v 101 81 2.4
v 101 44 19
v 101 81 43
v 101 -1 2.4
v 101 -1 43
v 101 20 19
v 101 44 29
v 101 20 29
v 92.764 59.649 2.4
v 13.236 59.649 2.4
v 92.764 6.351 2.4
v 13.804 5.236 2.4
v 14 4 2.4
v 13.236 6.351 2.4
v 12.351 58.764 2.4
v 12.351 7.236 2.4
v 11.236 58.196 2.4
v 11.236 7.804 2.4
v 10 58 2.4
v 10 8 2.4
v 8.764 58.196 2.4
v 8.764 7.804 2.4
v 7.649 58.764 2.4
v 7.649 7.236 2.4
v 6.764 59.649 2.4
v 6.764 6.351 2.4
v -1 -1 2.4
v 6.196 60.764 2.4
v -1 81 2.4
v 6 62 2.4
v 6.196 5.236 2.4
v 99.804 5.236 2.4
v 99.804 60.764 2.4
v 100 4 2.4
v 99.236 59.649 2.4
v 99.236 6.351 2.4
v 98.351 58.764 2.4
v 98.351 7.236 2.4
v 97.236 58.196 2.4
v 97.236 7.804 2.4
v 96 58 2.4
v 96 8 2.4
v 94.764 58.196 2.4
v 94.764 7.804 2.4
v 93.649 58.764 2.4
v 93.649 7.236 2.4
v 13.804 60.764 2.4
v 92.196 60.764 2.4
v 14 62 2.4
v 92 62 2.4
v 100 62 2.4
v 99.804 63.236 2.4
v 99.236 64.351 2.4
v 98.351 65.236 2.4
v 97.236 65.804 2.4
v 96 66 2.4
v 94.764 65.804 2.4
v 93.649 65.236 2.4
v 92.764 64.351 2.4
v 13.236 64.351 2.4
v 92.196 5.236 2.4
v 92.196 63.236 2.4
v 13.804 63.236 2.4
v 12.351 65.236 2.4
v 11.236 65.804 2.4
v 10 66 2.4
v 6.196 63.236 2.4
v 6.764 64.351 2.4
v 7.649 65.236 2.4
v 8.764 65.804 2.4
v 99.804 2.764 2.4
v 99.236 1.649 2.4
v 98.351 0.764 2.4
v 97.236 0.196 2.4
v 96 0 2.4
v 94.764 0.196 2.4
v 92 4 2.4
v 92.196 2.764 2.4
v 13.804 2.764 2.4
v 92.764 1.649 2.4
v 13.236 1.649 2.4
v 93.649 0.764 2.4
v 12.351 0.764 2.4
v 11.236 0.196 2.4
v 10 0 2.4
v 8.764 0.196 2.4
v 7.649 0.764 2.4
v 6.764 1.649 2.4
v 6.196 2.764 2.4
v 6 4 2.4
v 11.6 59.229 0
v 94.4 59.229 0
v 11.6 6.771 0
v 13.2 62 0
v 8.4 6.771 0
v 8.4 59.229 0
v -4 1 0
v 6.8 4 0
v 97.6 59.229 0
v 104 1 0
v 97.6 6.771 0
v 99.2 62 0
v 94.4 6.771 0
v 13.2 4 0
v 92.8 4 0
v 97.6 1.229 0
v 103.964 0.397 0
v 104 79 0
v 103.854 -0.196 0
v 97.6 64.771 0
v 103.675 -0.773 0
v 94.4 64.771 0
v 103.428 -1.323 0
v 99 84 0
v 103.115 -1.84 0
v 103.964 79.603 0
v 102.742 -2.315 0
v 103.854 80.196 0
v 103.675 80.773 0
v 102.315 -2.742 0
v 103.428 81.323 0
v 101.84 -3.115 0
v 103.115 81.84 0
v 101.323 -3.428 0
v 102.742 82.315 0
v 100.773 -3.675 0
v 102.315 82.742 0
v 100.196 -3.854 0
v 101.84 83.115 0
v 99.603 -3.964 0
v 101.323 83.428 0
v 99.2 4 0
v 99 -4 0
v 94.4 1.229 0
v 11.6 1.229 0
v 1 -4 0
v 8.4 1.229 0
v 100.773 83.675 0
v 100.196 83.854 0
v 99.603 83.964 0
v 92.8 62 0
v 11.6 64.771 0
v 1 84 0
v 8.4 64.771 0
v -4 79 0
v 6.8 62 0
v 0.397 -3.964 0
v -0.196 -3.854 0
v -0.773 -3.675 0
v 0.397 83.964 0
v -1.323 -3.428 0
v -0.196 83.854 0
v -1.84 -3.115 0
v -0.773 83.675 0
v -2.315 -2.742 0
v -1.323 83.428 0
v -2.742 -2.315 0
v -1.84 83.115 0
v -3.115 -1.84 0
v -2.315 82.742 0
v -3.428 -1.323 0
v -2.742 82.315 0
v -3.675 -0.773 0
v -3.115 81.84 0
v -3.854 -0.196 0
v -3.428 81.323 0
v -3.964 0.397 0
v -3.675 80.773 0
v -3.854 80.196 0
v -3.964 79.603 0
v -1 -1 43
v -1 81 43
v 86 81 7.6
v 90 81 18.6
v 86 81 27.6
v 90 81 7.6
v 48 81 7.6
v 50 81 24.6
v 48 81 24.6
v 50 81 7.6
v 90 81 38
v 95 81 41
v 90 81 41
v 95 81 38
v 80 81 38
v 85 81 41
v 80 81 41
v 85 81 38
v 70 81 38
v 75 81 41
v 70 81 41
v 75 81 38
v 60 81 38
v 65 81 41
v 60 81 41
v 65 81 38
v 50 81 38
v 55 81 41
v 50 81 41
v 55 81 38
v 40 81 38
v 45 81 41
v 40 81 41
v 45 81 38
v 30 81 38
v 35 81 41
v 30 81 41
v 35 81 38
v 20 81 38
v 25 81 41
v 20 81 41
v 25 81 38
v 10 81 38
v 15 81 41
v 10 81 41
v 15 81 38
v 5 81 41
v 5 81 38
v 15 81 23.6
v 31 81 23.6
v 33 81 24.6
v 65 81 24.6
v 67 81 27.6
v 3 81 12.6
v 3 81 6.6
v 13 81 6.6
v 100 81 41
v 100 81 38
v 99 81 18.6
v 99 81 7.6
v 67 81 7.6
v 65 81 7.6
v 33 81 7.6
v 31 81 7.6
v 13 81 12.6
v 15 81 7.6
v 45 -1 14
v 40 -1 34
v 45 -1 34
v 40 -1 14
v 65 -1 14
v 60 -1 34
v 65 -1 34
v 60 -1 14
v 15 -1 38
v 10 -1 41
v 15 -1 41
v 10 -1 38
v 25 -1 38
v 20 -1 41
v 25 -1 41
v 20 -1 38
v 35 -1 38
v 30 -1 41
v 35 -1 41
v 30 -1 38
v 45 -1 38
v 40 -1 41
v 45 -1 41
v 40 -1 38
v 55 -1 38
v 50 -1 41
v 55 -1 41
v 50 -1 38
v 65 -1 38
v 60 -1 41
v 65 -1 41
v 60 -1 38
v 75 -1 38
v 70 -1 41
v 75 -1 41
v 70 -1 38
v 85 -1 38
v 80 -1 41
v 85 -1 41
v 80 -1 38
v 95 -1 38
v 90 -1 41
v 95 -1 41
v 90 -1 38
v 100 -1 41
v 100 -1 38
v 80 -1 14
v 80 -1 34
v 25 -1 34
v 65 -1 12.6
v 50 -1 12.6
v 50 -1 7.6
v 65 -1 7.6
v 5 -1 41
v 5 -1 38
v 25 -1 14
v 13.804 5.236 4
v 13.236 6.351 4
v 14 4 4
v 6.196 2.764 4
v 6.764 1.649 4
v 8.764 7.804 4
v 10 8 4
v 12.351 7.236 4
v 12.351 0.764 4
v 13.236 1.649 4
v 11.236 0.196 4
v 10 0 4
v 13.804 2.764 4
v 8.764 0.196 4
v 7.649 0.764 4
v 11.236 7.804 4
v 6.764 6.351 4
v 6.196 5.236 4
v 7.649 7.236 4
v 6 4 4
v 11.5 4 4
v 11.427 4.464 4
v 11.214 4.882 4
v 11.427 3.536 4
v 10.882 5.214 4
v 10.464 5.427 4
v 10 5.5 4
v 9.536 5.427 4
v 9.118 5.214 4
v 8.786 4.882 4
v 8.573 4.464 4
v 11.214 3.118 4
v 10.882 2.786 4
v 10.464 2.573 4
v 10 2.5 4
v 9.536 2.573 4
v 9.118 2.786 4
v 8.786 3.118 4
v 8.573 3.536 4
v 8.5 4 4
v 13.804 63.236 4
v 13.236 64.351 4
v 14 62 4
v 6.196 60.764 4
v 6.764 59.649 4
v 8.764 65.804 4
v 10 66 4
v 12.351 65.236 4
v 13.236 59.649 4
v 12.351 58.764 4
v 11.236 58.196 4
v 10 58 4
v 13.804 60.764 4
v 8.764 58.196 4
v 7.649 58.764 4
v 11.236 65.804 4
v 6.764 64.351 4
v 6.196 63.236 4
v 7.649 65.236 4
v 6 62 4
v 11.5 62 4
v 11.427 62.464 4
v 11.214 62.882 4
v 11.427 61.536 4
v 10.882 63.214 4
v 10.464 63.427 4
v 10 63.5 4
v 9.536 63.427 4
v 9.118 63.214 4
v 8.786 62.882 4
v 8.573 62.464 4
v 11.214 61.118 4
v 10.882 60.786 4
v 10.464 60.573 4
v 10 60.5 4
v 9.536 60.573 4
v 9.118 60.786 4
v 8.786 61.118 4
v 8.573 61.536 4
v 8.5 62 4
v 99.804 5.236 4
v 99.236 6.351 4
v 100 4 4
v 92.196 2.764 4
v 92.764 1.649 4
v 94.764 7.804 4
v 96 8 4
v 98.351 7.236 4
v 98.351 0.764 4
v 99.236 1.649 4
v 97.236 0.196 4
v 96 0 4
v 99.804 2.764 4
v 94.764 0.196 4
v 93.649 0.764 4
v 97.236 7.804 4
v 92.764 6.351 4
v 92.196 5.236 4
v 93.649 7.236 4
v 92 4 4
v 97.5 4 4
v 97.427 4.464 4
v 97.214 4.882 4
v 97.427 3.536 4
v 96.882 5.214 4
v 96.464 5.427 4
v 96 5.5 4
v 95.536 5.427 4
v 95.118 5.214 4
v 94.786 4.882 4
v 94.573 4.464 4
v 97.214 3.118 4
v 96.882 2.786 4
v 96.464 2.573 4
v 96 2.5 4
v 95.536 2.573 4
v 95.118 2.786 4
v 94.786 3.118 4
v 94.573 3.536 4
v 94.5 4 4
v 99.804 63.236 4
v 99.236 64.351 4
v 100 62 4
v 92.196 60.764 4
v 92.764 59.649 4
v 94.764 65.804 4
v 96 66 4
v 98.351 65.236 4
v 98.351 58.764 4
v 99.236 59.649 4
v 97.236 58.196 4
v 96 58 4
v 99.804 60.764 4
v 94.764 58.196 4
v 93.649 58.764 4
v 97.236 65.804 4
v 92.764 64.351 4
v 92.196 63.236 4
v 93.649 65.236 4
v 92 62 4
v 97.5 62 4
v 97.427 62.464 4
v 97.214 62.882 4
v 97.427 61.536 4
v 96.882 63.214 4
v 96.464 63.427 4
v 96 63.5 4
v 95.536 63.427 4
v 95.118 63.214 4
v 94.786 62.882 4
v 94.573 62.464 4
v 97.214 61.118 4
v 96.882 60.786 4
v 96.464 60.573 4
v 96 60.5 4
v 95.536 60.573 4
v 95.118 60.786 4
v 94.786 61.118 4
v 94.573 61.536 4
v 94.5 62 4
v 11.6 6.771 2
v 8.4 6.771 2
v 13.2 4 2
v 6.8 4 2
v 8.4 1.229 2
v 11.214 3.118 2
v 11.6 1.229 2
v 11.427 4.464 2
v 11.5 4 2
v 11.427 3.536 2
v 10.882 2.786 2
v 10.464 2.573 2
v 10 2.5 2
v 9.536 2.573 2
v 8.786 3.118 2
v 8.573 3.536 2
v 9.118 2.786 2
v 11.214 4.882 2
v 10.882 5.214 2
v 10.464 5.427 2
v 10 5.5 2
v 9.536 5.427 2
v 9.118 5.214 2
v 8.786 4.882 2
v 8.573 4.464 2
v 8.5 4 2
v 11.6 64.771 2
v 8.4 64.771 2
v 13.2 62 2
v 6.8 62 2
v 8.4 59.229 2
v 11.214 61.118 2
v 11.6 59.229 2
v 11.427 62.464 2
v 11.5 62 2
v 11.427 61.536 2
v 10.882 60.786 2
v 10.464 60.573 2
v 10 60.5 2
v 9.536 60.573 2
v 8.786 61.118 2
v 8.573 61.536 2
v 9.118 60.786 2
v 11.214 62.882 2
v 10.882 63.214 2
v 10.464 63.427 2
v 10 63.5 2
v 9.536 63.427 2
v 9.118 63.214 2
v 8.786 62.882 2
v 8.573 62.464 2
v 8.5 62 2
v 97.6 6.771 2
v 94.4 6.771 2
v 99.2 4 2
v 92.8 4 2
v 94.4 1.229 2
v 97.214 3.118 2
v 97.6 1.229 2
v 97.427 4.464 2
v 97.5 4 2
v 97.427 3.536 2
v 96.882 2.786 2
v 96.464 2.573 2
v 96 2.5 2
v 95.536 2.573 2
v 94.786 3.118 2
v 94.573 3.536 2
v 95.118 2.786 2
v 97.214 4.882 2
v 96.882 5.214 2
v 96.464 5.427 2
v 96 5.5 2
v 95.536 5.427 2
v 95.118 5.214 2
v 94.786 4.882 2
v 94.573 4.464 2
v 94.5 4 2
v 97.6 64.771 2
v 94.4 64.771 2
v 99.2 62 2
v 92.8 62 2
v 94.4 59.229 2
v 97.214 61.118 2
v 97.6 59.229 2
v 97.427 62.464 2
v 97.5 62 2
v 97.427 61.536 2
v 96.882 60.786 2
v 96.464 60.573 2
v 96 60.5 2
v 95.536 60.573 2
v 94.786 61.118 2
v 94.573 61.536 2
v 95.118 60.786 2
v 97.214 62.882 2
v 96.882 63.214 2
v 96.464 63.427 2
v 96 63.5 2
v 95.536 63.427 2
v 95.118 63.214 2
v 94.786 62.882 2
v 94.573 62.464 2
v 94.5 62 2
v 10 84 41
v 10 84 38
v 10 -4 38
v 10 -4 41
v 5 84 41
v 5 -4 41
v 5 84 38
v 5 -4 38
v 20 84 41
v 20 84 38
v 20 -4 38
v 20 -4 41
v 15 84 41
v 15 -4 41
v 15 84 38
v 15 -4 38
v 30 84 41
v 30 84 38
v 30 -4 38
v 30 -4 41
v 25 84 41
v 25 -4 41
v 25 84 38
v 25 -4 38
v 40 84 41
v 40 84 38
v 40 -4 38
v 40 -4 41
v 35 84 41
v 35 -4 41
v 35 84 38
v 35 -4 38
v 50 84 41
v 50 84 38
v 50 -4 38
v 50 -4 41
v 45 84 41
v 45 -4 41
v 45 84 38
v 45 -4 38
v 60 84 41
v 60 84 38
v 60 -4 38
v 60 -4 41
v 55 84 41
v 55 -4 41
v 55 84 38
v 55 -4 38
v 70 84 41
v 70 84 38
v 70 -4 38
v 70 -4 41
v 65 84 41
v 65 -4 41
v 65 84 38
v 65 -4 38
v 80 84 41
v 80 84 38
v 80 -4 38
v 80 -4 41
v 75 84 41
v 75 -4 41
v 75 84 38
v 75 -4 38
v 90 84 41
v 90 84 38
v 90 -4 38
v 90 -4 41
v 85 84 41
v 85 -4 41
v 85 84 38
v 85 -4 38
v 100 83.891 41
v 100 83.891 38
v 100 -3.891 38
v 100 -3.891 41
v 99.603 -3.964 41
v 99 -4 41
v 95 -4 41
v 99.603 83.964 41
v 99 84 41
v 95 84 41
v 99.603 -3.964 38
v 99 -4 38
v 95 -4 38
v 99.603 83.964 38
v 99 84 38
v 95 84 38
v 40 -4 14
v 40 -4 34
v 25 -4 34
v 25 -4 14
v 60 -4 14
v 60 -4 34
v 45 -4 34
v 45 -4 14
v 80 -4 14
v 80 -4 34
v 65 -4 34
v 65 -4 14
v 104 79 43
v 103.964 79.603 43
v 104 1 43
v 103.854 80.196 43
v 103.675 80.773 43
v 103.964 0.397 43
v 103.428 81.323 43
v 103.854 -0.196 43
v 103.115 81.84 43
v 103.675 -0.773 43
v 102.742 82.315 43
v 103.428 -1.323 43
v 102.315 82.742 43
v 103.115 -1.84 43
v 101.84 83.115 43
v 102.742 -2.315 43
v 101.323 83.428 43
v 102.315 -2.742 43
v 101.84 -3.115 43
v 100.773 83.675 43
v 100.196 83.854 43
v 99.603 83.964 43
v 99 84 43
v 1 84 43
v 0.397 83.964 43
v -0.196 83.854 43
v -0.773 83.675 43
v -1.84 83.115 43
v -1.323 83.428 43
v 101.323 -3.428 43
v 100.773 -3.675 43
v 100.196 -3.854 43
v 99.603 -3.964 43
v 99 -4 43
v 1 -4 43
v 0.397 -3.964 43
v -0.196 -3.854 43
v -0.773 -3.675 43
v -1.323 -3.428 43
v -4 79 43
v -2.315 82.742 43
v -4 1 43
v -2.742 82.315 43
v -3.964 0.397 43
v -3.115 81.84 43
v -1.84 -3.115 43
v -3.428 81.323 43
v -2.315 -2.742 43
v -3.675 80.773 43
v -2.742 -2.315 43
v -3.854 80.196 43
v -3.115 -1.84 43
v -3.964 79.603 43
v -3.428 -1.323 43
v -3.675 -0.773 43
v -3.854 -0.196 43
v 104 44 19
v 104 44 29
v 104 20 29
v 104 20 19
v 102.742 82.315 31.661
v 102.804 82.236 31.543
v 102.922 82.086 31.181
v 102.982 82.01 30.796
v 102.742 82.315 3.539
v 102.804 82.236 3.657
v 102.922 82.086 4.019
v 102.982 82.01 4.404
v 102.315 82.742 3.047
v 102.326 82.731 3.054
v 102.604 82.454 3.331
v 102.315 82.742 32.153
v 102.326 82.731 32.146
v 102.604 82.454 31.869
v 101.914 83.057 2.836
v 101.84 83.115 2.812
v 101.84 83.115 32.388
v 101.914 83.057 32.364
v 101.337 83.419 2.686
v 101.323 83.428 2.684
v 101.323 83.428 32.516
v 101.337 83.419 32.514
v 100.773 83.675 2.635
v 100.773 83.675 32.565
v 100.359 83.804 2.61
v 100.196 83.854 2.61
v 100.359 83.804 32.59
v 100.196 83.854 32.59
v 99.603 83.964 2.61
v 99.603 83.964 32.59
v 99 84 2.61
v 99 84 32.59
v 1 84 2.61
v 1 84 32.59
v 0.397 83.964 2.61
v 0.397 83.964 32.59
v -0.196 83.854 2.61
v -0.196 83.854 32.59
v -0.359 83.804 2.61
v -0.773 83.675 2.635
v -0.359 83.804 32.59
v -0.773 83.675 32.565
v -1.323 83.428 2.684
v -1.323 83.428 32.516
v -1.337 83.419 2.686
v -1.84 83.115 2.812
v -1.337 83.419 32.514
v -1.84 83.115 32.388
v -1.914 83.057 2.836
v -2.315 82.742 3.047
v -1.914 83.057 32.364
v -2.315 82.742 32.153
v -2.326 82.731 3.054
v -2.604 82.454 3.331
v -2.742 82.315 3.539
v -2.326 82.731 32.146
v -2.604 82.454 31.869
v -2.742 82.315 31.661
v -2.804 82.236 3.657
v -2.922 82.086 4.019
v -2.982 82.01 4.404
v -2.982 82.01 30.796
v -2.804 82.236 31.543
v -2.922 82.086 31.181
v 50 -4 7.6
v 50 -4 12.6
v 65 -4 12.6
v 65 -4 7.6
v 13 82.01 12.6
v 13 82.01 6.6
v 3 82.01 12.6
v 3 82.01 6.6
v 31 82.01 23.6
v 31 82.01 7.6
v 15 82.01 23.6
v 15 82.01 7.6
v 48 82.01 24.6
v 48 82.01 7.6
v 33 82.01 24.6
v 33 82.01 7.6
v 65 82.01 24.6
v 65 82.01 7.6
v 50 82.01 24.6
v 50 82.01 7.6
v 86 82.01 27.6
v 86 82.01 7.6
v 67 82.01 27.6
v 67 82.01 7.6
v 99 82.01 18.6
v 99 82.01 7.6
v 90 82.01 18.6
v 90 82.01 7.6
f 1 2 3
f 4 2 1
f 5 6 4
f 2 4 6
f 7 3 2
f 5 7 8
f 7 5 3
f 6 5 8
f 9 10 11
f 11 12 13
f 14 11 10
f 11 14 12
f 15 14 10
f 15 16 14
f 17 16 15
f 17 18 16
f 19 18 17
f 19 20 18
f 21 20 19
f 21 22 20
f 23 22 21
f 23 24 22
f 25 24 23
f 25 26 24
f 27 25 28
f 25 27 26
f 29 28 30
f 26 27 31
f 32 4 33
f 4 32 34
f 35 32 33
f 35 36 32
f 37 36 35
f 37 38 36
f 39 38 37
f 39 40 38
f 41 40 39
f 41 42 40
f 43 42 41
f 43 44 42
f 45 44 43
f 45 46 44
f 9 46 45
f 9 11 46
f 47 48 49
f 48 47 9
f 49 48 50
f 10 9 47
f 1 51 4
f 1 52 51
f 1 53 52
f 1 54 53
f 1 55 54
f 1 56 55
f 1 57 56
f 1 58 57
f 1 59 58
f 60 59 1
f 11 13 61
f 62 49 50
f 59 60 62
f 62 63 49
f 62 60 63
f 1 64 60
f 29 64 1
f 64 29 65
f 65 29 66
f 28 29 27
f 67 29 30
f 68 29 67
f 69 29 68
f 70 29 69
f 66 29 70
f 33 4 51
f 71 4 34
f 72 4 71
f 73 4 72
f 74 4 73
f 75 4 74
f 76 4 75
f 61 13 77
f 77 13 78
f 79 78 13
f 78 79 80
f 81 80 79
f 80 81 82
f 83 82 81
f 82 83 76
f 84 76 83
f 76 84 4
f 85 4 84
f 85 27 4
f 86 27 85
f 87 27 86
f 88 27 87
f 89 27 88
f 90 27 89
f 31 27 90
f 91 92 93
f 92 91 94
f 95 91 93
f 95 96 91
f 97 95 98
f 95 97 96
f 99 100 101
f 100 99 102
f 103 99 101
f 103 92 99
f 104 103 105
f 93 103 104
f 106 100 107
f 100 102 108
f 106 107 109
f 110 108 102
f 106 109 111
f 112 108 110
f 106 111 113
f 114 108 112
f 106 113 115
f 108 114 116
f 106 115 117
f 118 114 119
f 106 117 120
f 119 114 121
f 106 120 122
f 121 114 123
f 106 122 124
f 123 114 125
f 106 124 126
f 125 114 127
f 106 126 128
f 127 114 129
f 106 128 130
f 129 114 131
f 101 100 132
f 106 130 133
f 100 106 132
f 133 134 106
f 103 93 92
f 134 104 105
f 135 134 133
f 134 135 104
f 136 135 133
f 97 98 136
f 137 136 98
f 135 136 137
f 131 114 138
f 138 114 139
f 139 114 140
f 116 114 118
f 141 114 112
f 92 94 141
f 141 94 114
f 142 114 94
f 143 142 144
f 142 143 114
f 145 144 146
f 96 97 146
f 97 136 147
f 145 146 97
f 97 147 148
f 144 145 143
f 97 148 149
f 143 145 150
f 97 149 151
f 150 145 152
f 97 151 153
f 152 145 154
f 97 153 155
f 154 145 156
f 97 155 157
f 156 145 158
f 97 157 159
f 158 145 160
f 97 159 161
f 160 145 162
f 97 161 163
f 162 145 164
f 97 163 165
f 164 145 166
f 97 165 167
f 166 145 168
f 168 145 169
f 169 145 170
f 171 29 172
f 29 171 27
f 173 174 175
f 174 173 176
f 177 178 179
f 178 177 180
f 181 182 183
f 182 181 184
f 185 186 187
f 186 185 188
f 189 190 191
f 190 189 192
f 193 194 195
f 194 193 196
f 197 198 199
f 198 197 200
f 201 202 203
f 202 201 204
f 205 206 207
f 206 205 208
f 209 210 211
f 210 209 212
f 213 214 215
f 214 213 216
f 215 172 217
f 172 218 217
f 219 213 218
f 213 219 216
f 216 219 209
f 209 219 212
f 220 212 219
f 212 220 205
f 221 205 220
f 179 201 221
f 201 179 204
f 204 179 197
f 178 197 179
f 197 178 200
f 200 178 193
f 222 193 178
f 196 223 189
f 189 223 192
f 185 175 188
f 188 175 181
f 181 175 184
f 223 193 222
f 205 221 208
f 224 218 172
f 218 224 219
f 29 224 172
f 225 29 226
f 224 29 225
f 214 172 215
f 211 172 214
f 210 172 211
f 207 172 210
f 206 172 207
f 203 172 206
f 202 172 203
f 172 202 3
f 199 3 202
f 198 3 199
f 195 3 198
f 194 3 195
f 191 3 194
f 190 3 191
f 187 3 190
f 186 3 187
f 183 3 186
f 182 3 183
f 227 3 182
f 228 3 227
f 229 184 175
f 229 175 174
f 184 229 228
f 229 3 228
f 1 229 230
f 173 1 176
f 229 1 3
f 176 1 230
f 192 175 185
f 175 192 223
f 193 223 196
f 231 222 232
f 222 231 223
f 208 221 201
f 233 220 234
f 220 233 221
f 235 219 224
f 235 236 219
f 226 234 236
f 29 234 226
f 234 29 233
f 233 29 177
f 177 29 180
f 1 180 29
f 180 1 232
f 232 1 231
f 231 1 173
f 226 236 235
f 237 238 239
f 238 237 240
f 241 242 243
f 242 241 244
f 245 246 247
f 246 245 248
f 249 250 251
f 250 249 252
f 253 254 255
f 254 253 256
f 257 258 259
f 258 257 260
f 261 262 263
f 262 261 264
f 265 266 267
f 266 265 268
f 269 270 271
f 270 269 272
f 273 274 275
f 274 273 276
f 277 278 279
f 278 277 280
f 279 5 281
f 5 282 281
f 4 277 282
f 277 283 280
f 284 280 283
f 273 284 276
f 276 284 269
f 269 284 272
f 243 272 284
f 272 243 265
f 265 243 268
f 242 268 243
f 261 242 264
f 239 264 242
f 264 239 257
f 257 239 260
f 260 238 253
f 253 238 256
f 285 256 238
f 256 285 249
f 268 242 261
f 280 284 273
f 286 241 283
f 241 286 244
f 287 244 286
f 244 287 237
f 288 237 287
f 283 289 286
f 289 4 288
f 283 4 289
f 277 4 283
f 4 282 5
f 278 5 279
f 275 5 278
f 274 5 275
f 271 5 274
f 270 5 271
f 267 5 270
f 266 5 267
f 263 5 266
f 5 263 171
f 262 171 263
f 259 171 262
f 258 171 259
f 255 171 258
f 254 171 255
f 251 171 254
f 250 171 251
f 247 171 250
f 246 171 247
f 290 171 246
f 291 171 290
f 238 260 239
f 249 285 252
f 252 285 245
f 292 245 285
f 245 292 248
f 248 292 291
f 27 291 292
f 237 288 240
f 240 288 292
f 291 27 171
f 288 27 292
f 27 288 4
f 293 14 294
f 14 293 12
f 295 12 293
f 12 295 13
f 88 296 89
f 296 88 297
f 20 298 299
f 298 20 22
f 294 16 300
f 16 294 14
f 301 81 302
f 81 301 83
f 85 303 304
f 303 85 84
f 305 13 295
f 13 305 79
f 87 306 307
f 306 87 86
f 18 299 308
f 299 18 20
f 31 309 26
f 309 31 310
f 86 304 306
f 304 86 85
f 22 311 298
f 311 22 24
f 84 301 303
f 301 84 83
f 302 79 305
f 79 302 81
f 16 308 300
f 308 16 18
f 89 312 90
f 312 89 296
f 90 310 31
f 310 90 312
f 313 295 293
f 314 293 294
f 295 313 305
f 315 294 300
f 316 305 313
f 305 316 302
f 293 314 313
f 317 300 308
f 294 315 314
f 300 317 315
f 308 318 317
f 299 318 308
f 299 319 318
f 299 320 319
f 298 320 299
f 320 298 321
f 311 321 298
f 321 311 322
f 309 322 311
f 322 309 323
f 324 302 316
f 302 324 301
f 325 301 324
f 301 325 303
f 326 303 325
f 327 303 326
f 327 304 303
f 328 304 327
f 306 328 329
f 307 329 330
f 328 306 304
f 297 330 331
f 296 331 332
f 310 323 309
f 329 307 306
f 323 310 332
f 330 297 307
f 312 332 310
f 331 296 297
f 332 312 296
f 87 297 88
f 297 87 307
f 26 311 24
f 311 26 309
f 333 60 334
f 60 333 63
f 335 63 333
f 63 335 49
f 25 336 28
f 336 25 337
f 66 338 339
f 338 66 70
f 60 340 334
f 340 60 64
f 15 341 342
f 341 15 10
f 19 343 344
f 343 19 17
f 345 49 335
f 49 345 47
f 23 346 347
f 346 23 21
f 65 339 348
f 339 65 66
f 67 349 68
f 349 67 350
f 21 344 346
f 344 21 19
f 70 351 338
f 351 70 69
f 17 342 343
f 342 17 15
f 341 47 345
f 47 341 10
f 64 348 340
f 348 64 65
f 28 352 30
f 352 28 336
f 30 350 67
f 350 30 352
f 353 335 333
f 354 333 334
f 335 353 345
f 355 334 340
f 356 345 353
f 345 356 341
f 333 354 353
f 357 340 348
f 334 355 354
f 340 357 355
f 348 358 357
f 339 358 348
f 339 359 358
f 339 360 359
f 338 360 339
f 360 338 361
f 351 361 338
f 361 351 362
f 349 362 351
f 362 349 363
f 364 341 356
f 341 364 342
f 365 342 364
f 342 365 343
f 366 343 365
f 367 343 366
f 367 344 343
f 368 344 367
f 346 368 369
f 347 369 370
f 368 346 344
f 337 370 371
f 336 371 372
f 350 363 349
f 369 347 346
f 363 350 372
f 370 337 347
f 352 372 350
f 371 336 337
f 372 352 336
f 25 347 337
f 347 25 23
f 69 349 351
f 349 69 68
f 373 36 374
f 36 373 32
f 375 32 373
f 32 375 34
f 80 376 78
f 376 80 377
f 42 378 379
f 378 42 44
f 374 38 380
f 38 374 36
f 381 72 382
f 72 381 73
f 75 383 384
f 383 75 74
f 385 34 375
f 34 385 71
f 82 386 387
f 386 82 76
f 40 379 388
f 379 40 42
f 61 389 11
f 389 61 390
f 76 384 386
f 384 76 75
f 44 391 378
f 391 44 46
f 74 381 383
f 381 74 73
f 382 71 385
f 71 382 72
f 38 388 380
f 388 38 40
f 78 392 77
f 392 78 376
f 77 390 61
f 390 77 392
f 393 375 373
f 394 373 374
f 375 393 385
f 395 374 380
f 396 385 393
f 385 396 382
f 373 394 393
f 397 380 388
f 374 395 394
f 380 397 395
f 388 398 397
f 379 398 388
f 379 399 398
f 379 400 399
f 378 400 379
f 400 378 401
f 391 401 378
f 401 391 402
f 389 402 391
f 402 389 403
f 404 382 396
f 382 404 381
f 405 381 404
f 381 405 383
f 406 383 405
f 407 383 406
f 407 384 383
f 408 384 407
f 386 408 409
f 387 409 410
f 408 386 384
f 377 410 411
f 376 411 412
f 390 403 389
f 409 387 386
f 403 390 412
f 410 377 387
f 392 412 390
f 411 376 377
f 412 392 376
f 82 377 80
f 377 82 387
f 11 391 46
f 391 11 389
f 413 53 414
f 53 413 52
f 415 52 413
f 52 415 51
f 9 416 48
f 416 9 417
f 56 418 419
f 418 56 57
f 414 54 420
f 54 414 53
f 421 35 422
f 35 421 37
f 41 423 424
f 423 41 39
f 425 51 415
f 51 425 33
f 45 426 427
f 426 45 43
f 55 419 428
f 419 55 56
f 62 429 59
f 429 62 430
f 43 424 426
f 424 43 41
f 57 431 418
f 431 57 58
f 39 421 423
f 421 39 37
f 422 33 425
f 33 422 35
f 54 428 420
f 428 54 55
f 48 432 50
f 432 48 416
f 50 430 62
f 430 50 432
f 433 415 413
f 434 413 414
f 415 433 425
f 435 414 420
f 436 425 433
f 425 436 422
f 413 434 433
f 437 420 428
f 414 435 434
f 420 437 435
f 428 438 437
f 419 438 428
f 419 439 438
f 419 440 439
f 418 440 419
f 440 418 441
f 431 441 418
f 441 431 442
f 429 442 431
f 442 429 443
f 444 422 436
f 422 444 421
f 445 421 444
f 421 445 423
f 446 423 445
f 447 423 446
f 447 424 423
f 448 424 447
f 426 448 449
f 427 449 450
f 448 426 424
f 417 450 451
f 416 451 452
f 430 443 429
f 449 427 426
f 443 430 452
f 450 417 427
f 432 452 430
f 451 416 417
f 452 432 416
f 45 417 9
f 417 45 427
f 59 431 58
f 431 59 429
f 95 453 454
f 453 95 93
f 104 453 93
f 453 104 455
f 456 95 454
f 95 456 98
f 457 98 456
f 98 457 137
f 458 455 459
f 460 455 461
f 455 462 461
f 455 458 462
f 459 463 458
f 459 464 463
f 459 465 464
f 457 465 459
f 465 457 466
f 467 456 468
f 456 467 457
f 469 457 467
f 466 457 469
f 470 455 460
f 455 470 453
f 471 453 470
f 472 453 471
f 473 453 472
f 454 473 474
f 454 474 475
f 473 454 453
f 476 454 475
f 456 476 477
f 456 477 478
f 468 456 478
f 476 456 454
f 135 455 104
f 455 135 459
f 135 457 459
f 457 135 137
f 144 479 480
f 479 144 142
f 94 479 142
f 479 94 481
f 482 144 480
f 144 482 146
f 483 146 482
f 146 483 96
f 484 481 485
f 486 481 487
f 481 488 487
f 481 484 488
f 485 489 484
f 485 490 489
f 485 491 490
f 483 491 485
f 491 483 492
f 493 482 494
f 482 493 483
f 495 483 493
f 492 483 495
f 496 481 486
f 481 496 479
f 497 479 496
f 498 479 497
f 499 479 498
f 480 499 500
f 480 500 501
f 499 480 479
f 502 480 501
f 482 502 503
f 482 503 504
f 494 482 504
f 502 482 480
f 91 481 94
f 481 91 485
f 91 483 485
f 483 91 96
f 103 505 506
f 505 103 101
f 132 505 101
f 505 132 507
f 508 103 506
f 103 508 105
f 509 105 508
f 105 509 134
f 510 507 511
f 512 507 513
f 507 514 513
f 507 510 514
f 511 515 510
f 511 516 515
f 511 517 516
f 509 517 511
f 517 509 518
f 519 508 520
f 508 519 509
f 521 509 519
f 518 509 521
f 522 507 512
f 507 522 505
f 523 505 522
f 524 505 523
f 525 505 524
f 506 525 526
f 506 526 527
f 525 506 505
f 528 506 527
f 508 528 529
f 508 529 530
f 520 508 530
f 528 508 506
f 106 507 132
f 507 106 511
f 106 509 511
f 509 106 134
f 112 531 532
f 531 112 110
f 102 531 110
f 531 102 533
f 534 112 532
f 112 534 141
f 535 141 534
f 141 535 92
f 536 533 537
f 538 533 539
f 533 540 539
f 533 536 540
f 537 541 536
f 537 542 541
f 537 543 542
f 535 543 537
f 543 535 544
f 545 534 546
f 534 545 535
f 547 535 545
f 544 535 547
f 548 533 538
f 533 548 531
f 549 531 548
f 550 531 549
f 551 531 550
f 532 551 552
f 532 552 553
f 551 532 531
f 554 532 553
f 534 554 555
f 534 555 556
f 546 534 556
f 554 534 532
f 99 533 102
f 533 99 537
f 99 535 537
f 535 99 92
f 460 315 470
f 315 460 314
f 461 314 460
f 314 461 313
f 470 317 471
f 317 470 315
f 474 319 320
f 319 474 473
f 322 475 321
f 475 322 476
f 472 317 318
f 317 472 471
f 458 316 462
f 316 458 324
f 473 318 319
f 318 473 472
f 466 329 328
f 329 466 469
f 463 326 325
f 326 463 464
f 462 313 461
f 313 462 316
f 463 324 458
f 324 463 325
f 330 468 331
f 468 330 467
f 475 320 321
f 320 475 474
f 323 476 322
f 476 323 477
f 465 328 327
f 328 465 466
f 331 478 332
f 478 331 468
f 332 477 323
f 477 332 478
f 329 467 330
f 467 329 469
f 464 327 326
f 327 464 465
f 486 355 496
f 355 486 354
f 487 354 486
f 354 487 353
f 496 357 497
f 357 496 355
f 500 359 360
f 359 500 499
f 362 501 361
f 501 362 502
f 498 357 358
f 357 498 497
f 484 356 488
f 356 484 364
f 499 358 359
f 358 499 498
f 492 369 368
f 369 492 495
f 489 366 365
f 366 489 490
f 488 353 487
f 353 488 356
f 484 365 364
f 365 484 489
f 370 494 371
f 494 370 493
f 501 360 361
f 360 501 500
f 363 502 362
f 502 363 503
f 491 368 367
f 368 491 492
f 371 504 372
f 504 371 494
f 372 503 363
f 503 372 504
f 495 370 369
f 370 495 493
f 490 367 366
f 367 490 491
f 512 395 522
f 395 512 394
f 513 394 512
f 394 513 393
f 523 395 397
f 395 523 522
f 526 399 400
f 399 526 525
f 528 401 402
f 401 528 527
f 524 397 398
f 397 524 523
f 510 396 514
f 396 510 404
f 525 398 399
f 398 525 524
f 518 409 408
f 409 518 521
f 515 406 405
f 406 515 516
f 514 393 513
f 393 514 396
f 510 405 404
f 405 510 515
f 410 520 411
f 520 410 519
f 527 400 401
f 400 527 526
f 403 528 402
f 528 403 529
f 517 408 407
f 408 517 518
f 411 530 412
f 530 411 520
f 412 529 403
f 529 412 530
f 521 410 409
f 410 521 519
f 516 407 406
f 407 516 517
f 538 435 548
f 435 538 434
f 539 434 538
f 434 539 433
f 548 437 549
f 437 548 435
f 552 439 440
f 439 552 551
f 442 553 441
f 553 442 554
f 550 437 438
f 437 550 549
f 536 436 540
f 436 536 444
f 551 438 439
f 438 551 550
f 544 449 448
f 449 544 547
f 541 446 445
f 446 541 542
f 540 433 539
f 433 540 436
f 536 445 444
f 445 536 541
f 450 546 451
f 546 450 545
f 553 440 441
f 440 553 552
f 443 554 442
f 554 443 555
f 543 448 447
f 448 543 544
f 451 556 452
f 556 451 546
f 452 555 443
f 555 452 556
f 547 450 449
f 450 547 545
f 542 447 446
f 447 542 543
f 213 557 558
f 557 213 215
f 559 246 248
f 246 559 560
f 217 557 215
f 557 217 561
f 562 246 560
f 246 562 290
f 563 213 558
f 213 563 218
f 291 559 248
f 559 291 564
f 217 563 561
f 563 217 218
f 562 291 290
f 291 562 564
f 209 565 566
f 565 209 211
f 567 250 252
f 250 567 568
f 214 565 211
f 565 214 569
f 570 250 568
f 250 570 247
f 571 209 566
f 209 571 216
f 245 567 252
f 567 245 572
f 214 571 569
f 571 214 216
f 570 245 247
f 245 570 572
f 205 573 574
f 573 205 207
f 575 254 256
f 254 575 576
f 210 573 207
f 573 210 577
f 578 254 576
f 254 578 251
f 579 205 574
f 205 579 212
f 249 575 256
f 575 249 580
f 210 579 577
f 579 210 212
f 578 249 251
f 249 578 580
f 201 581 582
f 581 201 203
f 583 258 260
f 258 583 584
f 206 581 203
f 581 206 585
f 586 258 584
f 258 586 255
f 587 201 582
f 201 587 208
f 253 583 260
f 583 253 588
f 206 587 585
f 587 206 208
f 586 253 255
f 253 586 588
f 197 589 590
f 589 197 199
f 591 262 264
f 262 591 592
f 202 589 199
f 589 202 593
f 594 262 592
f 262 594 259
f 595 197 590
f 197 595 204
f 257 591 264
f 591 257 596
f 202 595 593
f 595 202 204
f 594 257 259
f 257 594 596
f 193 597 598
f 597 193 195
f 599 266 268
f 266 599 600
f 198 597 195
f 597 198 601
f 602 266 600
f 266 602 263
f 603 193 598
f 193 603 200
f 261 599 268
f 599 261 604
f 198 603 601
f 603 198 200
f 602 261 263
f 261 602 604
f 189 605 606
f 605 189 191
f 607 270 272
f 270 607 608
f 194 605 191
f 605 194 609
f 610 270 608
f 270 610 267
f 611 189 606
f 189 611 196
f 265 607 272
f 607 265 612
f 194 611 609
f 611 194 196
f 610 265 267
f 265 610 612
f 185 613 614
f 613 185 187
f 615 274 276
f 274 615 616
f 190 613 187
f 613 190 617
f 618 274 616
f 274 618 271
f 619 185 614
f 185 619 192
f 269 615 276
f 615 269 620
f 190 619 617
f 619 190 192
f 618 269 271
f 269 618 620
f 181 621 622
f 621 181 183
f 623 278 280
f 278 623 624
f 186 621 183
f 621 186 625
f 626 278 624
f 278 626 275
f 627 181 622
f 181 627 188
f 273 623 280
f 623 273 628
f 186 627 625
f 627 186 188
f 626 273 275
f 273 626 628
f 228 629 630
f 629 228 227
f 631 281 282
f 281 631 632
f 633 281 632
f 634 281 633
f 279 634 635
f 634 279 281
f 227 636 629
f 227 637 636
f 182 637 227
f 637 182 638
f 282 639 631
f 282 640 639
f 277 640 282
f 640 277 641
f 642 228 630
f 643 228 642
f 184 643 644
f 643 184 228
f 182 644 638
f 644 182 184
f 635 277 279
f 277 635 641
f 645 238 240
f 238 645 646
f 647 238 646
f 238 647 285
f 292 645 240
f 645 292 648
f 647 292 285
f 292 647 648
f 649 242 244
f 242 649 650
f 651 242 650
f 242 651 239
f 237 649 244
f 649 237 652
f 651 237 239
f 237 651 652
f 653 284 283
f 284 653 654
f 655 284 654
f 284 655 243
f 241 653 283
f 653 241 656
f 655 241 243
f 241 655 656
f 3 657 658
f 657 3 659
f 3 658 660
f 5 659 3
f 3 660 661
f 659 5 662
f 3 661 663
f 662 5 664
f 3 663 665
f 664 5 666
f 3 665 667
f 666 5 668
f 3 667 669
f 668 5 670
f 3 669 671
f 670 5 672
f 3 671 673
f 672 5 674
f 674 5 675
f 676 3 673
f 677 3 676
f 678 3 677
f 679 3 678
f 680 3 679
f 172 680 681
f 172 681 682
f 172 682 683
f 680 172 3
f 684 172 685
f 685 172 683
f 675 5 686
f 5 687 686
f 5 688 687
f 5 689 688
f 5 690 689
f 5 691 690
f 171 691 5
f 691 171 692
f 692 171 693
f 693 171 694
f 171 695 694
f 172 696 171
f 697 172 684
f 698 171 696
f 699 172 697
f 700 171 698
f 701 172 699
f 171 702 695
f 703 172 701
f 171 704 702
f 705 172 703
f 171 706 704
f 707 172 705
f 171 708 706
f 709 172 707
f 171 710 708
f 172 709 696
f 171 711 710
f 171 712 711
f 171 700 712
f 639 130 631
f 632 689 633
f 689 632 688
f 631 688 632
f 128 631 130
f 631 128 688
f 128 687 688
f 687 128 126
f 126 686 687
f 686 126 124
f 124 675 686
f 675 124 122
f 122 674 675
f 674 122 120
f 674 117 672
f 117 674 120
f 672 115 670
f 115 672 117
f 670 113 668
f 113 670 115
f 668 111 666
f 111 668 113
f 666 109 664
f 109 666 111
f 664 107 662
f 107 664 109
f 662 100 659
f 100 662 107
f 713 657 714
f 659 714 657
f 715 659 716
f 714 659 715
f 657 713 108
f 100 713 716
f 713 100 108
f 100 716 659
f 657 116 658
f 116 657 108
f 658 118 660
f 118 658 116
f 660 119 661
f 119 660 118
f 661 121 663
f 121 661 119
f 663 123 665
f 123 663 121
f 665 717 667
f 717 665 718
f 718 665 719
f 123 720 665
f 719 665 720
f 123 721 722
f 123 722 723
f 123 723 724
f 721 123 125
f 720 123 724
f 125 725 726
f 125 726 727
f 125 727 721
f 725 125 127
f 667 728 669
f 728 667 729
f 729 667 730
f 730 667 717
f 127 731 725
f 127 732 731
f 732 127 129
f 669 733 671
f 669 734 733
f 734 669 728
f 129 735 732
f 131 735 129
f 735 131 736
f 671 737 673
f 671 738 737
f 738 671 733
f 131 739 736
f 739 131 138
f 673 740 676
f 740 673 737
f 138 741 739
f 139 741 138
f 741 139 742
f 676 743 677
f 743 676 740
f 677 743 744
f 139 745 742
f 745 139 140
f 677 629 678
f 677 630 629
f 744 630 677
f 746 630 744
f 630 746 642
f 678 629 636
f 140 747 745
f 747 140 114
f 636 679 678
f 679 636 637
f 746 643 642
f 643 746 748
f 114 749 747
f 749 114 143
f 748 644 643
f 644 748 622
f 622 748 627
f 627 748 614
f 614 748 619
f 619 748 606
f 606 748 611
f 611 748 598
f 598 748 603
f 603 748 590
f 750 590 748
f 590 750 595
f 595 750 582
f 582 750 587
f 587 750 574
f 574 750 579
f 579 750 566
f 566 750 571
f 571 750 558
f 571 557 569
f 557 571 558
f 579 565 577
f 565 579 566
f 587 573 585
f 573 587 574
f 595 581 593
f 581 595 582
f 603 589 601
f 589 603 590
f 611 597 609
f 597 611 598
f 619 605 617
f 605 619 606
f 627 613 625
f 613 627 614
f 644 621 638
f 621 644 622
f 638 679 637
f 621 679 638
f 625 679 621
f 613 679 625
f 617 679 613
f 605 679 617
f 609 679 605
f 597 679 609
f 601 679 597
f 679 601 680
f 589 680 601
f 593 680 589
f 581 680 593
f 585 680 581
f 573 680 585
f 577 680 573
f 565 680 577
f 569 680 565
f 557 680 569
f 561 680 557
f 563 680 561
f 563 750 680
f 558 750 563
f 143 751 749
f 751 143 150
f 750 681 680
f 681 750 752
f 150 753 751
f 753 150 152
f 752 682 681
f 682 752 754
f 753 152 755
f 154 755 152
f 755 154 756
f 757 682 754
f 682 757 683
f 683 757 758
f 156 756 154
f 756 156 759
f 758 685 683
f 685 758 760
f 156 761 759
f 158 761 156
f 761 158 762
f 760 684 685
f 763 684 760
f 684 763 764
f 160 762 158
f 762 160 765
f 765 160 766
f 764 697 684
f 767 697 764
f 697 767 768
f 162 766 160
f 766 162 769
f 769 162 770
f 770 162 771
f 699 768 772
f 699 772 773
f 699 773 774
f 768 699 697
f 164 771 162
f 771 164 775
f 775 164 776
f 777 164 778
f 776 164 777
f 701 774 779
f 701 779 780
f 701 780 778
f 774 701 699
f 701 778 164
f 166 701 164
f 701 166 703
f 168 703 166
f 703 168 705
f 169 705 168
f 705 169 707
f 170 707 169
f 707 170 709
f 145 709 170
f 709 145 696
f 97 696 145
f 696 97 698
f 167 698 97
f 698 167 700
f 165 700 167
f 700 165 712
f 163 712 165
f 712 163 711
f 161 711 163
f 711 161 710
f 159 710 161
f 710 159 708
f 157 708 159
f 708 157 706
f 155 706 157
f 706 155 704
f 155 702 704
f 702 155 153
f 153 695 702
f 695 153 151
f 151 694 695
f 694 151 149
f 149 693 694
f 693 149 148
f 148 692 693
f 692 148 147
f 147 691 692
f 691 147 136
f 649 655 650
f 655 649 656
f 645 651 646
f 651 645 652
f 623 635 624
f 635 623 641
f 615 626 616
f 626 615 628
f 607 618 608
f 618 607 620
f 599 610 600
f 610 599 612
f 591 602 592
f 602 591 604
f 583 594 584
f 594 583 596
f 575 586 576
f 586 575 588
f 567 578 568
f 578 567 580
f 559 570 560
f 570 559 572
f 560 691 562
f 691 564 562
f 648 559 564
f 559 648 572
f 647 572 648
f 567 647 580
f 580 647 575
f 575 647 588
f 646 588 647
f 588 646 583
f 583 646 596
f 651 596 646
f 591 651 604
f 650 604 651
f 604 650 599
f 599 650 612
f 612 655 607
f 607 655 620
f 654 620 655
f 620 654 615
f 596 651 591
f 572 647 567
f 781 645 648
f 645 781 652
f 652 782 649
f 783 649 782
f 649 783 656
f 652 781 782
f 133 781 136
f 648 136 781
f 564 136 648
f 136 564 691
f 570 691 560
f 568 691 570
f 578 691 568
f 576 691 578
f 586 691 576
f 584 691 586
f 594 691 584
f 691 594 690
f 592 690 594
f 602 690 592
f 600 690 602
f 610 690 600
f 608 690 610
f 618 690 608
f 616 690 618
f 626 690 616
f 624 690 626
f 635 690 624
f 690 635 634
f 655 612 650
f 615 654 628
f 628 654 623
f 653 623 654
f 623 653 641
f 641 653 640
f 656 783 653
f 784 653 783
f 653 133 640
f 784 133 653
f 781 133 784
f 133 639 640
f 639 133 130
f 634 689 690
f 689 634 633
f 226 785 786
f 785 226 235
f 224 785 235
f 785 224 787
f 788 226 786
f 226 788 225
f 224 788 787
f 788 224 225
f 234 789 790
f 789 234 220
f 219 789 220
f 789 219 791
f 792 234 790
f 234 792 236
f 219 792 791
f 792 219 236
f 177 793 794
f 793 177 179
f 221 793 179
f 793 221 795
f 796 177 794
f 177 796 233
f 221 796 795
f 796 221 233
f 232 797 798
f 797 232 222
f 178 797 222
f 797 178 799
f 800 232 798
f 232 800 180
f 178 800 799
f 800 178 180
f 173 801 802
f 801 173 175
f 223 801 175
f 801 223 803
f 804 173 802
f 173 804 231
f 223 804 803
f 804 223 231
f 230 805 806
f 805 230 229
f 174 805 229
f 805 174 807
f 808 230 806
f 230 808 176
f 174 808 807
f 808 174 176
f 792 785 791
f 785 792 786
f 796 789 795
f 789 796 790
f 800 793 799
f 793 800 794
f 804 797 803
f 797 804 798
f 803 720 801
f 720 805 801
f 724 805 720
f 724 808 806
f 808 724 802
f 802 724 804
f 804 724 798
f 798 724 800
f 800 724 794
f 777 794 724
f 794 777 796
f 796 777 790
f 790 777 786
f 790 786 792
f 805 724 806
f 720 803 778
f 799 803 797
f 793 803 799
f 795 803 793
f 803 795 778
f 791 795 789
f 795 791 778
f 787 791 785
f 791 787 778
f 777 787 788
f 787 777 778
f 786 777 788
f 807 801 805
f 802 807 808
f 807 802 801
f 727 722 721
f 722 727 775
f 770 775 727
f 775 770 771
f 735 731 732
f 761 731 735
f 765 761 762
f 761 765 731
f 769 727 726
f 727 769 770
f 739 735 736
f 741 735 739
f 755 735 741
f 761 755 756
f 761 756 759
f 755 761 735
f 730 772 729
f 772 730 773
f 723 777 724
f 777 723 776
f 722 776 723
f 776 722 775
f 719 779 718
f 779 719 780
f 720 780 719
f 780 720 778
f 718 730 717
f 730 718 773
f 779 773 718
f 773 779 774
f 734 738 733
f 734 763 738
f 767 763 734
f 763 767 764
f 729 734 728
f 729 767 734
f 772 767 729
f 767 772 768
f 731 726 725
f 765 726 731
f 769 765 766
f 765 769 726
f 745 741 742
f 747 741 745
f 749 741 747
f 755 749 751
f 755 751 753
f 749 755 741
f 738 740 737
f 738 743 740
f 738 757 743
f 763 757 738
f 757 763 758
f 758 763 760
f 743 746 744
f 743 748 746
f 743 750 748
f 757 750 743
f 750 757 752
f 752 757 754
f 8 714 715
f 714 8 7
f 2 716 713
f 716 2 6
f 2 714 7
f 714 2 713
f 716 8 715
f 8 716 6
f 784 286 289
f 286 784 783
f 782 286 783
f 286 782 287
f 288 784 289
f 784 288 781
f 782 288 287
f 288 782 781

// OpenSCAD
height = 4; // not a height of anything - just a constant
screw = 3;//2.5
screw_nut = 6.4;//5.6
// bottom part
difference(){
	union() {
	translate([-1,-1,0])
		cube([102,82,2.4]);

	translate([10,4,2])
		cylinder(2,4,4, $fn=20);	
	translate([10,62,2])
		cylinder(2,4,4, $fn=20);
	translate([96,4,2])
		cylinder(2,4,4, $fn=20);
	translate([96,62,2])
		cylinder(2,4,4, $fn=20);
	} //end of union - bottom

//holes from bottom for M3 nuts
//*
translate([10,4,-2])
		cylinder(height,screw_nut/2,screw_nut/2, $fn=6);
translate([10,62,-2])
		cylinder(height,screw_nut/2,screw_nut/2, $fn=6);
translate([96,4,-2])
		cylinder(height,screw_nut/2,screw_nut/2, $fn=6);
translate([96,62,-2])
		cylinder(height,screw_nut/2,screw_nut/2, $fn=6);

//holes for screw
translate([10,4,0])
		cylinder(12,screw/2,screw/2, $fn=20);
translate([10,62,0])
		cylinder(12,screw/2,screw/2, $fn=20);
translate([96,4,0])
		cylinder(12,screw/2,screw/2, $fn=20);
translate([96,62,0])
		cylinder(12,screw/2,screw/2, $fn=20);

}//end of difference - bottom


//main part - side part
difference(){
linear_extrude(height+39)
	import("../dxf/JetsonNano_out.dxf", $fn=50);

//microUSB
translate([3,75,height+2.6])
	cube([10,15,6]);
//Ethernet
translate([15,75,height+3.6])
	cube([16,15,16]);

//USB3
translate([33,75,height+3.6])
	cube([15,15,17]);

//USB3
translate([50,75,height+3.6])
	cube([15,15,17]);

//HDMI\DP
translate([67,75,height+3.6])
	cube([19,15,20]);

//Power 5V 
translate([90,75,height+3.6])
	cube([9,15,11]);

//thiner I\O side
translate([-4,84,height+0.6])
	minkowski(){
		cube([110,90,26]);
	sphere(2,$fn=32);
	}

//top holes
for (i =[5:10:95]){
	translate([(i),-5,height+34])
		cube([5,90,3]);
	}

// additional cam cable hole(side)
translate([100,20,height+15])
	cube([9,24,10]);

// cooling holes(back)
for (i =[0:20:50]){
	translate([25+i,-8,height+10])
		cube([15,10,20]);
	}

// additional cam cable hole(side)
translate([50,-8,height+3.6])
	cube([15,10,5]);
} //end difference - side()
